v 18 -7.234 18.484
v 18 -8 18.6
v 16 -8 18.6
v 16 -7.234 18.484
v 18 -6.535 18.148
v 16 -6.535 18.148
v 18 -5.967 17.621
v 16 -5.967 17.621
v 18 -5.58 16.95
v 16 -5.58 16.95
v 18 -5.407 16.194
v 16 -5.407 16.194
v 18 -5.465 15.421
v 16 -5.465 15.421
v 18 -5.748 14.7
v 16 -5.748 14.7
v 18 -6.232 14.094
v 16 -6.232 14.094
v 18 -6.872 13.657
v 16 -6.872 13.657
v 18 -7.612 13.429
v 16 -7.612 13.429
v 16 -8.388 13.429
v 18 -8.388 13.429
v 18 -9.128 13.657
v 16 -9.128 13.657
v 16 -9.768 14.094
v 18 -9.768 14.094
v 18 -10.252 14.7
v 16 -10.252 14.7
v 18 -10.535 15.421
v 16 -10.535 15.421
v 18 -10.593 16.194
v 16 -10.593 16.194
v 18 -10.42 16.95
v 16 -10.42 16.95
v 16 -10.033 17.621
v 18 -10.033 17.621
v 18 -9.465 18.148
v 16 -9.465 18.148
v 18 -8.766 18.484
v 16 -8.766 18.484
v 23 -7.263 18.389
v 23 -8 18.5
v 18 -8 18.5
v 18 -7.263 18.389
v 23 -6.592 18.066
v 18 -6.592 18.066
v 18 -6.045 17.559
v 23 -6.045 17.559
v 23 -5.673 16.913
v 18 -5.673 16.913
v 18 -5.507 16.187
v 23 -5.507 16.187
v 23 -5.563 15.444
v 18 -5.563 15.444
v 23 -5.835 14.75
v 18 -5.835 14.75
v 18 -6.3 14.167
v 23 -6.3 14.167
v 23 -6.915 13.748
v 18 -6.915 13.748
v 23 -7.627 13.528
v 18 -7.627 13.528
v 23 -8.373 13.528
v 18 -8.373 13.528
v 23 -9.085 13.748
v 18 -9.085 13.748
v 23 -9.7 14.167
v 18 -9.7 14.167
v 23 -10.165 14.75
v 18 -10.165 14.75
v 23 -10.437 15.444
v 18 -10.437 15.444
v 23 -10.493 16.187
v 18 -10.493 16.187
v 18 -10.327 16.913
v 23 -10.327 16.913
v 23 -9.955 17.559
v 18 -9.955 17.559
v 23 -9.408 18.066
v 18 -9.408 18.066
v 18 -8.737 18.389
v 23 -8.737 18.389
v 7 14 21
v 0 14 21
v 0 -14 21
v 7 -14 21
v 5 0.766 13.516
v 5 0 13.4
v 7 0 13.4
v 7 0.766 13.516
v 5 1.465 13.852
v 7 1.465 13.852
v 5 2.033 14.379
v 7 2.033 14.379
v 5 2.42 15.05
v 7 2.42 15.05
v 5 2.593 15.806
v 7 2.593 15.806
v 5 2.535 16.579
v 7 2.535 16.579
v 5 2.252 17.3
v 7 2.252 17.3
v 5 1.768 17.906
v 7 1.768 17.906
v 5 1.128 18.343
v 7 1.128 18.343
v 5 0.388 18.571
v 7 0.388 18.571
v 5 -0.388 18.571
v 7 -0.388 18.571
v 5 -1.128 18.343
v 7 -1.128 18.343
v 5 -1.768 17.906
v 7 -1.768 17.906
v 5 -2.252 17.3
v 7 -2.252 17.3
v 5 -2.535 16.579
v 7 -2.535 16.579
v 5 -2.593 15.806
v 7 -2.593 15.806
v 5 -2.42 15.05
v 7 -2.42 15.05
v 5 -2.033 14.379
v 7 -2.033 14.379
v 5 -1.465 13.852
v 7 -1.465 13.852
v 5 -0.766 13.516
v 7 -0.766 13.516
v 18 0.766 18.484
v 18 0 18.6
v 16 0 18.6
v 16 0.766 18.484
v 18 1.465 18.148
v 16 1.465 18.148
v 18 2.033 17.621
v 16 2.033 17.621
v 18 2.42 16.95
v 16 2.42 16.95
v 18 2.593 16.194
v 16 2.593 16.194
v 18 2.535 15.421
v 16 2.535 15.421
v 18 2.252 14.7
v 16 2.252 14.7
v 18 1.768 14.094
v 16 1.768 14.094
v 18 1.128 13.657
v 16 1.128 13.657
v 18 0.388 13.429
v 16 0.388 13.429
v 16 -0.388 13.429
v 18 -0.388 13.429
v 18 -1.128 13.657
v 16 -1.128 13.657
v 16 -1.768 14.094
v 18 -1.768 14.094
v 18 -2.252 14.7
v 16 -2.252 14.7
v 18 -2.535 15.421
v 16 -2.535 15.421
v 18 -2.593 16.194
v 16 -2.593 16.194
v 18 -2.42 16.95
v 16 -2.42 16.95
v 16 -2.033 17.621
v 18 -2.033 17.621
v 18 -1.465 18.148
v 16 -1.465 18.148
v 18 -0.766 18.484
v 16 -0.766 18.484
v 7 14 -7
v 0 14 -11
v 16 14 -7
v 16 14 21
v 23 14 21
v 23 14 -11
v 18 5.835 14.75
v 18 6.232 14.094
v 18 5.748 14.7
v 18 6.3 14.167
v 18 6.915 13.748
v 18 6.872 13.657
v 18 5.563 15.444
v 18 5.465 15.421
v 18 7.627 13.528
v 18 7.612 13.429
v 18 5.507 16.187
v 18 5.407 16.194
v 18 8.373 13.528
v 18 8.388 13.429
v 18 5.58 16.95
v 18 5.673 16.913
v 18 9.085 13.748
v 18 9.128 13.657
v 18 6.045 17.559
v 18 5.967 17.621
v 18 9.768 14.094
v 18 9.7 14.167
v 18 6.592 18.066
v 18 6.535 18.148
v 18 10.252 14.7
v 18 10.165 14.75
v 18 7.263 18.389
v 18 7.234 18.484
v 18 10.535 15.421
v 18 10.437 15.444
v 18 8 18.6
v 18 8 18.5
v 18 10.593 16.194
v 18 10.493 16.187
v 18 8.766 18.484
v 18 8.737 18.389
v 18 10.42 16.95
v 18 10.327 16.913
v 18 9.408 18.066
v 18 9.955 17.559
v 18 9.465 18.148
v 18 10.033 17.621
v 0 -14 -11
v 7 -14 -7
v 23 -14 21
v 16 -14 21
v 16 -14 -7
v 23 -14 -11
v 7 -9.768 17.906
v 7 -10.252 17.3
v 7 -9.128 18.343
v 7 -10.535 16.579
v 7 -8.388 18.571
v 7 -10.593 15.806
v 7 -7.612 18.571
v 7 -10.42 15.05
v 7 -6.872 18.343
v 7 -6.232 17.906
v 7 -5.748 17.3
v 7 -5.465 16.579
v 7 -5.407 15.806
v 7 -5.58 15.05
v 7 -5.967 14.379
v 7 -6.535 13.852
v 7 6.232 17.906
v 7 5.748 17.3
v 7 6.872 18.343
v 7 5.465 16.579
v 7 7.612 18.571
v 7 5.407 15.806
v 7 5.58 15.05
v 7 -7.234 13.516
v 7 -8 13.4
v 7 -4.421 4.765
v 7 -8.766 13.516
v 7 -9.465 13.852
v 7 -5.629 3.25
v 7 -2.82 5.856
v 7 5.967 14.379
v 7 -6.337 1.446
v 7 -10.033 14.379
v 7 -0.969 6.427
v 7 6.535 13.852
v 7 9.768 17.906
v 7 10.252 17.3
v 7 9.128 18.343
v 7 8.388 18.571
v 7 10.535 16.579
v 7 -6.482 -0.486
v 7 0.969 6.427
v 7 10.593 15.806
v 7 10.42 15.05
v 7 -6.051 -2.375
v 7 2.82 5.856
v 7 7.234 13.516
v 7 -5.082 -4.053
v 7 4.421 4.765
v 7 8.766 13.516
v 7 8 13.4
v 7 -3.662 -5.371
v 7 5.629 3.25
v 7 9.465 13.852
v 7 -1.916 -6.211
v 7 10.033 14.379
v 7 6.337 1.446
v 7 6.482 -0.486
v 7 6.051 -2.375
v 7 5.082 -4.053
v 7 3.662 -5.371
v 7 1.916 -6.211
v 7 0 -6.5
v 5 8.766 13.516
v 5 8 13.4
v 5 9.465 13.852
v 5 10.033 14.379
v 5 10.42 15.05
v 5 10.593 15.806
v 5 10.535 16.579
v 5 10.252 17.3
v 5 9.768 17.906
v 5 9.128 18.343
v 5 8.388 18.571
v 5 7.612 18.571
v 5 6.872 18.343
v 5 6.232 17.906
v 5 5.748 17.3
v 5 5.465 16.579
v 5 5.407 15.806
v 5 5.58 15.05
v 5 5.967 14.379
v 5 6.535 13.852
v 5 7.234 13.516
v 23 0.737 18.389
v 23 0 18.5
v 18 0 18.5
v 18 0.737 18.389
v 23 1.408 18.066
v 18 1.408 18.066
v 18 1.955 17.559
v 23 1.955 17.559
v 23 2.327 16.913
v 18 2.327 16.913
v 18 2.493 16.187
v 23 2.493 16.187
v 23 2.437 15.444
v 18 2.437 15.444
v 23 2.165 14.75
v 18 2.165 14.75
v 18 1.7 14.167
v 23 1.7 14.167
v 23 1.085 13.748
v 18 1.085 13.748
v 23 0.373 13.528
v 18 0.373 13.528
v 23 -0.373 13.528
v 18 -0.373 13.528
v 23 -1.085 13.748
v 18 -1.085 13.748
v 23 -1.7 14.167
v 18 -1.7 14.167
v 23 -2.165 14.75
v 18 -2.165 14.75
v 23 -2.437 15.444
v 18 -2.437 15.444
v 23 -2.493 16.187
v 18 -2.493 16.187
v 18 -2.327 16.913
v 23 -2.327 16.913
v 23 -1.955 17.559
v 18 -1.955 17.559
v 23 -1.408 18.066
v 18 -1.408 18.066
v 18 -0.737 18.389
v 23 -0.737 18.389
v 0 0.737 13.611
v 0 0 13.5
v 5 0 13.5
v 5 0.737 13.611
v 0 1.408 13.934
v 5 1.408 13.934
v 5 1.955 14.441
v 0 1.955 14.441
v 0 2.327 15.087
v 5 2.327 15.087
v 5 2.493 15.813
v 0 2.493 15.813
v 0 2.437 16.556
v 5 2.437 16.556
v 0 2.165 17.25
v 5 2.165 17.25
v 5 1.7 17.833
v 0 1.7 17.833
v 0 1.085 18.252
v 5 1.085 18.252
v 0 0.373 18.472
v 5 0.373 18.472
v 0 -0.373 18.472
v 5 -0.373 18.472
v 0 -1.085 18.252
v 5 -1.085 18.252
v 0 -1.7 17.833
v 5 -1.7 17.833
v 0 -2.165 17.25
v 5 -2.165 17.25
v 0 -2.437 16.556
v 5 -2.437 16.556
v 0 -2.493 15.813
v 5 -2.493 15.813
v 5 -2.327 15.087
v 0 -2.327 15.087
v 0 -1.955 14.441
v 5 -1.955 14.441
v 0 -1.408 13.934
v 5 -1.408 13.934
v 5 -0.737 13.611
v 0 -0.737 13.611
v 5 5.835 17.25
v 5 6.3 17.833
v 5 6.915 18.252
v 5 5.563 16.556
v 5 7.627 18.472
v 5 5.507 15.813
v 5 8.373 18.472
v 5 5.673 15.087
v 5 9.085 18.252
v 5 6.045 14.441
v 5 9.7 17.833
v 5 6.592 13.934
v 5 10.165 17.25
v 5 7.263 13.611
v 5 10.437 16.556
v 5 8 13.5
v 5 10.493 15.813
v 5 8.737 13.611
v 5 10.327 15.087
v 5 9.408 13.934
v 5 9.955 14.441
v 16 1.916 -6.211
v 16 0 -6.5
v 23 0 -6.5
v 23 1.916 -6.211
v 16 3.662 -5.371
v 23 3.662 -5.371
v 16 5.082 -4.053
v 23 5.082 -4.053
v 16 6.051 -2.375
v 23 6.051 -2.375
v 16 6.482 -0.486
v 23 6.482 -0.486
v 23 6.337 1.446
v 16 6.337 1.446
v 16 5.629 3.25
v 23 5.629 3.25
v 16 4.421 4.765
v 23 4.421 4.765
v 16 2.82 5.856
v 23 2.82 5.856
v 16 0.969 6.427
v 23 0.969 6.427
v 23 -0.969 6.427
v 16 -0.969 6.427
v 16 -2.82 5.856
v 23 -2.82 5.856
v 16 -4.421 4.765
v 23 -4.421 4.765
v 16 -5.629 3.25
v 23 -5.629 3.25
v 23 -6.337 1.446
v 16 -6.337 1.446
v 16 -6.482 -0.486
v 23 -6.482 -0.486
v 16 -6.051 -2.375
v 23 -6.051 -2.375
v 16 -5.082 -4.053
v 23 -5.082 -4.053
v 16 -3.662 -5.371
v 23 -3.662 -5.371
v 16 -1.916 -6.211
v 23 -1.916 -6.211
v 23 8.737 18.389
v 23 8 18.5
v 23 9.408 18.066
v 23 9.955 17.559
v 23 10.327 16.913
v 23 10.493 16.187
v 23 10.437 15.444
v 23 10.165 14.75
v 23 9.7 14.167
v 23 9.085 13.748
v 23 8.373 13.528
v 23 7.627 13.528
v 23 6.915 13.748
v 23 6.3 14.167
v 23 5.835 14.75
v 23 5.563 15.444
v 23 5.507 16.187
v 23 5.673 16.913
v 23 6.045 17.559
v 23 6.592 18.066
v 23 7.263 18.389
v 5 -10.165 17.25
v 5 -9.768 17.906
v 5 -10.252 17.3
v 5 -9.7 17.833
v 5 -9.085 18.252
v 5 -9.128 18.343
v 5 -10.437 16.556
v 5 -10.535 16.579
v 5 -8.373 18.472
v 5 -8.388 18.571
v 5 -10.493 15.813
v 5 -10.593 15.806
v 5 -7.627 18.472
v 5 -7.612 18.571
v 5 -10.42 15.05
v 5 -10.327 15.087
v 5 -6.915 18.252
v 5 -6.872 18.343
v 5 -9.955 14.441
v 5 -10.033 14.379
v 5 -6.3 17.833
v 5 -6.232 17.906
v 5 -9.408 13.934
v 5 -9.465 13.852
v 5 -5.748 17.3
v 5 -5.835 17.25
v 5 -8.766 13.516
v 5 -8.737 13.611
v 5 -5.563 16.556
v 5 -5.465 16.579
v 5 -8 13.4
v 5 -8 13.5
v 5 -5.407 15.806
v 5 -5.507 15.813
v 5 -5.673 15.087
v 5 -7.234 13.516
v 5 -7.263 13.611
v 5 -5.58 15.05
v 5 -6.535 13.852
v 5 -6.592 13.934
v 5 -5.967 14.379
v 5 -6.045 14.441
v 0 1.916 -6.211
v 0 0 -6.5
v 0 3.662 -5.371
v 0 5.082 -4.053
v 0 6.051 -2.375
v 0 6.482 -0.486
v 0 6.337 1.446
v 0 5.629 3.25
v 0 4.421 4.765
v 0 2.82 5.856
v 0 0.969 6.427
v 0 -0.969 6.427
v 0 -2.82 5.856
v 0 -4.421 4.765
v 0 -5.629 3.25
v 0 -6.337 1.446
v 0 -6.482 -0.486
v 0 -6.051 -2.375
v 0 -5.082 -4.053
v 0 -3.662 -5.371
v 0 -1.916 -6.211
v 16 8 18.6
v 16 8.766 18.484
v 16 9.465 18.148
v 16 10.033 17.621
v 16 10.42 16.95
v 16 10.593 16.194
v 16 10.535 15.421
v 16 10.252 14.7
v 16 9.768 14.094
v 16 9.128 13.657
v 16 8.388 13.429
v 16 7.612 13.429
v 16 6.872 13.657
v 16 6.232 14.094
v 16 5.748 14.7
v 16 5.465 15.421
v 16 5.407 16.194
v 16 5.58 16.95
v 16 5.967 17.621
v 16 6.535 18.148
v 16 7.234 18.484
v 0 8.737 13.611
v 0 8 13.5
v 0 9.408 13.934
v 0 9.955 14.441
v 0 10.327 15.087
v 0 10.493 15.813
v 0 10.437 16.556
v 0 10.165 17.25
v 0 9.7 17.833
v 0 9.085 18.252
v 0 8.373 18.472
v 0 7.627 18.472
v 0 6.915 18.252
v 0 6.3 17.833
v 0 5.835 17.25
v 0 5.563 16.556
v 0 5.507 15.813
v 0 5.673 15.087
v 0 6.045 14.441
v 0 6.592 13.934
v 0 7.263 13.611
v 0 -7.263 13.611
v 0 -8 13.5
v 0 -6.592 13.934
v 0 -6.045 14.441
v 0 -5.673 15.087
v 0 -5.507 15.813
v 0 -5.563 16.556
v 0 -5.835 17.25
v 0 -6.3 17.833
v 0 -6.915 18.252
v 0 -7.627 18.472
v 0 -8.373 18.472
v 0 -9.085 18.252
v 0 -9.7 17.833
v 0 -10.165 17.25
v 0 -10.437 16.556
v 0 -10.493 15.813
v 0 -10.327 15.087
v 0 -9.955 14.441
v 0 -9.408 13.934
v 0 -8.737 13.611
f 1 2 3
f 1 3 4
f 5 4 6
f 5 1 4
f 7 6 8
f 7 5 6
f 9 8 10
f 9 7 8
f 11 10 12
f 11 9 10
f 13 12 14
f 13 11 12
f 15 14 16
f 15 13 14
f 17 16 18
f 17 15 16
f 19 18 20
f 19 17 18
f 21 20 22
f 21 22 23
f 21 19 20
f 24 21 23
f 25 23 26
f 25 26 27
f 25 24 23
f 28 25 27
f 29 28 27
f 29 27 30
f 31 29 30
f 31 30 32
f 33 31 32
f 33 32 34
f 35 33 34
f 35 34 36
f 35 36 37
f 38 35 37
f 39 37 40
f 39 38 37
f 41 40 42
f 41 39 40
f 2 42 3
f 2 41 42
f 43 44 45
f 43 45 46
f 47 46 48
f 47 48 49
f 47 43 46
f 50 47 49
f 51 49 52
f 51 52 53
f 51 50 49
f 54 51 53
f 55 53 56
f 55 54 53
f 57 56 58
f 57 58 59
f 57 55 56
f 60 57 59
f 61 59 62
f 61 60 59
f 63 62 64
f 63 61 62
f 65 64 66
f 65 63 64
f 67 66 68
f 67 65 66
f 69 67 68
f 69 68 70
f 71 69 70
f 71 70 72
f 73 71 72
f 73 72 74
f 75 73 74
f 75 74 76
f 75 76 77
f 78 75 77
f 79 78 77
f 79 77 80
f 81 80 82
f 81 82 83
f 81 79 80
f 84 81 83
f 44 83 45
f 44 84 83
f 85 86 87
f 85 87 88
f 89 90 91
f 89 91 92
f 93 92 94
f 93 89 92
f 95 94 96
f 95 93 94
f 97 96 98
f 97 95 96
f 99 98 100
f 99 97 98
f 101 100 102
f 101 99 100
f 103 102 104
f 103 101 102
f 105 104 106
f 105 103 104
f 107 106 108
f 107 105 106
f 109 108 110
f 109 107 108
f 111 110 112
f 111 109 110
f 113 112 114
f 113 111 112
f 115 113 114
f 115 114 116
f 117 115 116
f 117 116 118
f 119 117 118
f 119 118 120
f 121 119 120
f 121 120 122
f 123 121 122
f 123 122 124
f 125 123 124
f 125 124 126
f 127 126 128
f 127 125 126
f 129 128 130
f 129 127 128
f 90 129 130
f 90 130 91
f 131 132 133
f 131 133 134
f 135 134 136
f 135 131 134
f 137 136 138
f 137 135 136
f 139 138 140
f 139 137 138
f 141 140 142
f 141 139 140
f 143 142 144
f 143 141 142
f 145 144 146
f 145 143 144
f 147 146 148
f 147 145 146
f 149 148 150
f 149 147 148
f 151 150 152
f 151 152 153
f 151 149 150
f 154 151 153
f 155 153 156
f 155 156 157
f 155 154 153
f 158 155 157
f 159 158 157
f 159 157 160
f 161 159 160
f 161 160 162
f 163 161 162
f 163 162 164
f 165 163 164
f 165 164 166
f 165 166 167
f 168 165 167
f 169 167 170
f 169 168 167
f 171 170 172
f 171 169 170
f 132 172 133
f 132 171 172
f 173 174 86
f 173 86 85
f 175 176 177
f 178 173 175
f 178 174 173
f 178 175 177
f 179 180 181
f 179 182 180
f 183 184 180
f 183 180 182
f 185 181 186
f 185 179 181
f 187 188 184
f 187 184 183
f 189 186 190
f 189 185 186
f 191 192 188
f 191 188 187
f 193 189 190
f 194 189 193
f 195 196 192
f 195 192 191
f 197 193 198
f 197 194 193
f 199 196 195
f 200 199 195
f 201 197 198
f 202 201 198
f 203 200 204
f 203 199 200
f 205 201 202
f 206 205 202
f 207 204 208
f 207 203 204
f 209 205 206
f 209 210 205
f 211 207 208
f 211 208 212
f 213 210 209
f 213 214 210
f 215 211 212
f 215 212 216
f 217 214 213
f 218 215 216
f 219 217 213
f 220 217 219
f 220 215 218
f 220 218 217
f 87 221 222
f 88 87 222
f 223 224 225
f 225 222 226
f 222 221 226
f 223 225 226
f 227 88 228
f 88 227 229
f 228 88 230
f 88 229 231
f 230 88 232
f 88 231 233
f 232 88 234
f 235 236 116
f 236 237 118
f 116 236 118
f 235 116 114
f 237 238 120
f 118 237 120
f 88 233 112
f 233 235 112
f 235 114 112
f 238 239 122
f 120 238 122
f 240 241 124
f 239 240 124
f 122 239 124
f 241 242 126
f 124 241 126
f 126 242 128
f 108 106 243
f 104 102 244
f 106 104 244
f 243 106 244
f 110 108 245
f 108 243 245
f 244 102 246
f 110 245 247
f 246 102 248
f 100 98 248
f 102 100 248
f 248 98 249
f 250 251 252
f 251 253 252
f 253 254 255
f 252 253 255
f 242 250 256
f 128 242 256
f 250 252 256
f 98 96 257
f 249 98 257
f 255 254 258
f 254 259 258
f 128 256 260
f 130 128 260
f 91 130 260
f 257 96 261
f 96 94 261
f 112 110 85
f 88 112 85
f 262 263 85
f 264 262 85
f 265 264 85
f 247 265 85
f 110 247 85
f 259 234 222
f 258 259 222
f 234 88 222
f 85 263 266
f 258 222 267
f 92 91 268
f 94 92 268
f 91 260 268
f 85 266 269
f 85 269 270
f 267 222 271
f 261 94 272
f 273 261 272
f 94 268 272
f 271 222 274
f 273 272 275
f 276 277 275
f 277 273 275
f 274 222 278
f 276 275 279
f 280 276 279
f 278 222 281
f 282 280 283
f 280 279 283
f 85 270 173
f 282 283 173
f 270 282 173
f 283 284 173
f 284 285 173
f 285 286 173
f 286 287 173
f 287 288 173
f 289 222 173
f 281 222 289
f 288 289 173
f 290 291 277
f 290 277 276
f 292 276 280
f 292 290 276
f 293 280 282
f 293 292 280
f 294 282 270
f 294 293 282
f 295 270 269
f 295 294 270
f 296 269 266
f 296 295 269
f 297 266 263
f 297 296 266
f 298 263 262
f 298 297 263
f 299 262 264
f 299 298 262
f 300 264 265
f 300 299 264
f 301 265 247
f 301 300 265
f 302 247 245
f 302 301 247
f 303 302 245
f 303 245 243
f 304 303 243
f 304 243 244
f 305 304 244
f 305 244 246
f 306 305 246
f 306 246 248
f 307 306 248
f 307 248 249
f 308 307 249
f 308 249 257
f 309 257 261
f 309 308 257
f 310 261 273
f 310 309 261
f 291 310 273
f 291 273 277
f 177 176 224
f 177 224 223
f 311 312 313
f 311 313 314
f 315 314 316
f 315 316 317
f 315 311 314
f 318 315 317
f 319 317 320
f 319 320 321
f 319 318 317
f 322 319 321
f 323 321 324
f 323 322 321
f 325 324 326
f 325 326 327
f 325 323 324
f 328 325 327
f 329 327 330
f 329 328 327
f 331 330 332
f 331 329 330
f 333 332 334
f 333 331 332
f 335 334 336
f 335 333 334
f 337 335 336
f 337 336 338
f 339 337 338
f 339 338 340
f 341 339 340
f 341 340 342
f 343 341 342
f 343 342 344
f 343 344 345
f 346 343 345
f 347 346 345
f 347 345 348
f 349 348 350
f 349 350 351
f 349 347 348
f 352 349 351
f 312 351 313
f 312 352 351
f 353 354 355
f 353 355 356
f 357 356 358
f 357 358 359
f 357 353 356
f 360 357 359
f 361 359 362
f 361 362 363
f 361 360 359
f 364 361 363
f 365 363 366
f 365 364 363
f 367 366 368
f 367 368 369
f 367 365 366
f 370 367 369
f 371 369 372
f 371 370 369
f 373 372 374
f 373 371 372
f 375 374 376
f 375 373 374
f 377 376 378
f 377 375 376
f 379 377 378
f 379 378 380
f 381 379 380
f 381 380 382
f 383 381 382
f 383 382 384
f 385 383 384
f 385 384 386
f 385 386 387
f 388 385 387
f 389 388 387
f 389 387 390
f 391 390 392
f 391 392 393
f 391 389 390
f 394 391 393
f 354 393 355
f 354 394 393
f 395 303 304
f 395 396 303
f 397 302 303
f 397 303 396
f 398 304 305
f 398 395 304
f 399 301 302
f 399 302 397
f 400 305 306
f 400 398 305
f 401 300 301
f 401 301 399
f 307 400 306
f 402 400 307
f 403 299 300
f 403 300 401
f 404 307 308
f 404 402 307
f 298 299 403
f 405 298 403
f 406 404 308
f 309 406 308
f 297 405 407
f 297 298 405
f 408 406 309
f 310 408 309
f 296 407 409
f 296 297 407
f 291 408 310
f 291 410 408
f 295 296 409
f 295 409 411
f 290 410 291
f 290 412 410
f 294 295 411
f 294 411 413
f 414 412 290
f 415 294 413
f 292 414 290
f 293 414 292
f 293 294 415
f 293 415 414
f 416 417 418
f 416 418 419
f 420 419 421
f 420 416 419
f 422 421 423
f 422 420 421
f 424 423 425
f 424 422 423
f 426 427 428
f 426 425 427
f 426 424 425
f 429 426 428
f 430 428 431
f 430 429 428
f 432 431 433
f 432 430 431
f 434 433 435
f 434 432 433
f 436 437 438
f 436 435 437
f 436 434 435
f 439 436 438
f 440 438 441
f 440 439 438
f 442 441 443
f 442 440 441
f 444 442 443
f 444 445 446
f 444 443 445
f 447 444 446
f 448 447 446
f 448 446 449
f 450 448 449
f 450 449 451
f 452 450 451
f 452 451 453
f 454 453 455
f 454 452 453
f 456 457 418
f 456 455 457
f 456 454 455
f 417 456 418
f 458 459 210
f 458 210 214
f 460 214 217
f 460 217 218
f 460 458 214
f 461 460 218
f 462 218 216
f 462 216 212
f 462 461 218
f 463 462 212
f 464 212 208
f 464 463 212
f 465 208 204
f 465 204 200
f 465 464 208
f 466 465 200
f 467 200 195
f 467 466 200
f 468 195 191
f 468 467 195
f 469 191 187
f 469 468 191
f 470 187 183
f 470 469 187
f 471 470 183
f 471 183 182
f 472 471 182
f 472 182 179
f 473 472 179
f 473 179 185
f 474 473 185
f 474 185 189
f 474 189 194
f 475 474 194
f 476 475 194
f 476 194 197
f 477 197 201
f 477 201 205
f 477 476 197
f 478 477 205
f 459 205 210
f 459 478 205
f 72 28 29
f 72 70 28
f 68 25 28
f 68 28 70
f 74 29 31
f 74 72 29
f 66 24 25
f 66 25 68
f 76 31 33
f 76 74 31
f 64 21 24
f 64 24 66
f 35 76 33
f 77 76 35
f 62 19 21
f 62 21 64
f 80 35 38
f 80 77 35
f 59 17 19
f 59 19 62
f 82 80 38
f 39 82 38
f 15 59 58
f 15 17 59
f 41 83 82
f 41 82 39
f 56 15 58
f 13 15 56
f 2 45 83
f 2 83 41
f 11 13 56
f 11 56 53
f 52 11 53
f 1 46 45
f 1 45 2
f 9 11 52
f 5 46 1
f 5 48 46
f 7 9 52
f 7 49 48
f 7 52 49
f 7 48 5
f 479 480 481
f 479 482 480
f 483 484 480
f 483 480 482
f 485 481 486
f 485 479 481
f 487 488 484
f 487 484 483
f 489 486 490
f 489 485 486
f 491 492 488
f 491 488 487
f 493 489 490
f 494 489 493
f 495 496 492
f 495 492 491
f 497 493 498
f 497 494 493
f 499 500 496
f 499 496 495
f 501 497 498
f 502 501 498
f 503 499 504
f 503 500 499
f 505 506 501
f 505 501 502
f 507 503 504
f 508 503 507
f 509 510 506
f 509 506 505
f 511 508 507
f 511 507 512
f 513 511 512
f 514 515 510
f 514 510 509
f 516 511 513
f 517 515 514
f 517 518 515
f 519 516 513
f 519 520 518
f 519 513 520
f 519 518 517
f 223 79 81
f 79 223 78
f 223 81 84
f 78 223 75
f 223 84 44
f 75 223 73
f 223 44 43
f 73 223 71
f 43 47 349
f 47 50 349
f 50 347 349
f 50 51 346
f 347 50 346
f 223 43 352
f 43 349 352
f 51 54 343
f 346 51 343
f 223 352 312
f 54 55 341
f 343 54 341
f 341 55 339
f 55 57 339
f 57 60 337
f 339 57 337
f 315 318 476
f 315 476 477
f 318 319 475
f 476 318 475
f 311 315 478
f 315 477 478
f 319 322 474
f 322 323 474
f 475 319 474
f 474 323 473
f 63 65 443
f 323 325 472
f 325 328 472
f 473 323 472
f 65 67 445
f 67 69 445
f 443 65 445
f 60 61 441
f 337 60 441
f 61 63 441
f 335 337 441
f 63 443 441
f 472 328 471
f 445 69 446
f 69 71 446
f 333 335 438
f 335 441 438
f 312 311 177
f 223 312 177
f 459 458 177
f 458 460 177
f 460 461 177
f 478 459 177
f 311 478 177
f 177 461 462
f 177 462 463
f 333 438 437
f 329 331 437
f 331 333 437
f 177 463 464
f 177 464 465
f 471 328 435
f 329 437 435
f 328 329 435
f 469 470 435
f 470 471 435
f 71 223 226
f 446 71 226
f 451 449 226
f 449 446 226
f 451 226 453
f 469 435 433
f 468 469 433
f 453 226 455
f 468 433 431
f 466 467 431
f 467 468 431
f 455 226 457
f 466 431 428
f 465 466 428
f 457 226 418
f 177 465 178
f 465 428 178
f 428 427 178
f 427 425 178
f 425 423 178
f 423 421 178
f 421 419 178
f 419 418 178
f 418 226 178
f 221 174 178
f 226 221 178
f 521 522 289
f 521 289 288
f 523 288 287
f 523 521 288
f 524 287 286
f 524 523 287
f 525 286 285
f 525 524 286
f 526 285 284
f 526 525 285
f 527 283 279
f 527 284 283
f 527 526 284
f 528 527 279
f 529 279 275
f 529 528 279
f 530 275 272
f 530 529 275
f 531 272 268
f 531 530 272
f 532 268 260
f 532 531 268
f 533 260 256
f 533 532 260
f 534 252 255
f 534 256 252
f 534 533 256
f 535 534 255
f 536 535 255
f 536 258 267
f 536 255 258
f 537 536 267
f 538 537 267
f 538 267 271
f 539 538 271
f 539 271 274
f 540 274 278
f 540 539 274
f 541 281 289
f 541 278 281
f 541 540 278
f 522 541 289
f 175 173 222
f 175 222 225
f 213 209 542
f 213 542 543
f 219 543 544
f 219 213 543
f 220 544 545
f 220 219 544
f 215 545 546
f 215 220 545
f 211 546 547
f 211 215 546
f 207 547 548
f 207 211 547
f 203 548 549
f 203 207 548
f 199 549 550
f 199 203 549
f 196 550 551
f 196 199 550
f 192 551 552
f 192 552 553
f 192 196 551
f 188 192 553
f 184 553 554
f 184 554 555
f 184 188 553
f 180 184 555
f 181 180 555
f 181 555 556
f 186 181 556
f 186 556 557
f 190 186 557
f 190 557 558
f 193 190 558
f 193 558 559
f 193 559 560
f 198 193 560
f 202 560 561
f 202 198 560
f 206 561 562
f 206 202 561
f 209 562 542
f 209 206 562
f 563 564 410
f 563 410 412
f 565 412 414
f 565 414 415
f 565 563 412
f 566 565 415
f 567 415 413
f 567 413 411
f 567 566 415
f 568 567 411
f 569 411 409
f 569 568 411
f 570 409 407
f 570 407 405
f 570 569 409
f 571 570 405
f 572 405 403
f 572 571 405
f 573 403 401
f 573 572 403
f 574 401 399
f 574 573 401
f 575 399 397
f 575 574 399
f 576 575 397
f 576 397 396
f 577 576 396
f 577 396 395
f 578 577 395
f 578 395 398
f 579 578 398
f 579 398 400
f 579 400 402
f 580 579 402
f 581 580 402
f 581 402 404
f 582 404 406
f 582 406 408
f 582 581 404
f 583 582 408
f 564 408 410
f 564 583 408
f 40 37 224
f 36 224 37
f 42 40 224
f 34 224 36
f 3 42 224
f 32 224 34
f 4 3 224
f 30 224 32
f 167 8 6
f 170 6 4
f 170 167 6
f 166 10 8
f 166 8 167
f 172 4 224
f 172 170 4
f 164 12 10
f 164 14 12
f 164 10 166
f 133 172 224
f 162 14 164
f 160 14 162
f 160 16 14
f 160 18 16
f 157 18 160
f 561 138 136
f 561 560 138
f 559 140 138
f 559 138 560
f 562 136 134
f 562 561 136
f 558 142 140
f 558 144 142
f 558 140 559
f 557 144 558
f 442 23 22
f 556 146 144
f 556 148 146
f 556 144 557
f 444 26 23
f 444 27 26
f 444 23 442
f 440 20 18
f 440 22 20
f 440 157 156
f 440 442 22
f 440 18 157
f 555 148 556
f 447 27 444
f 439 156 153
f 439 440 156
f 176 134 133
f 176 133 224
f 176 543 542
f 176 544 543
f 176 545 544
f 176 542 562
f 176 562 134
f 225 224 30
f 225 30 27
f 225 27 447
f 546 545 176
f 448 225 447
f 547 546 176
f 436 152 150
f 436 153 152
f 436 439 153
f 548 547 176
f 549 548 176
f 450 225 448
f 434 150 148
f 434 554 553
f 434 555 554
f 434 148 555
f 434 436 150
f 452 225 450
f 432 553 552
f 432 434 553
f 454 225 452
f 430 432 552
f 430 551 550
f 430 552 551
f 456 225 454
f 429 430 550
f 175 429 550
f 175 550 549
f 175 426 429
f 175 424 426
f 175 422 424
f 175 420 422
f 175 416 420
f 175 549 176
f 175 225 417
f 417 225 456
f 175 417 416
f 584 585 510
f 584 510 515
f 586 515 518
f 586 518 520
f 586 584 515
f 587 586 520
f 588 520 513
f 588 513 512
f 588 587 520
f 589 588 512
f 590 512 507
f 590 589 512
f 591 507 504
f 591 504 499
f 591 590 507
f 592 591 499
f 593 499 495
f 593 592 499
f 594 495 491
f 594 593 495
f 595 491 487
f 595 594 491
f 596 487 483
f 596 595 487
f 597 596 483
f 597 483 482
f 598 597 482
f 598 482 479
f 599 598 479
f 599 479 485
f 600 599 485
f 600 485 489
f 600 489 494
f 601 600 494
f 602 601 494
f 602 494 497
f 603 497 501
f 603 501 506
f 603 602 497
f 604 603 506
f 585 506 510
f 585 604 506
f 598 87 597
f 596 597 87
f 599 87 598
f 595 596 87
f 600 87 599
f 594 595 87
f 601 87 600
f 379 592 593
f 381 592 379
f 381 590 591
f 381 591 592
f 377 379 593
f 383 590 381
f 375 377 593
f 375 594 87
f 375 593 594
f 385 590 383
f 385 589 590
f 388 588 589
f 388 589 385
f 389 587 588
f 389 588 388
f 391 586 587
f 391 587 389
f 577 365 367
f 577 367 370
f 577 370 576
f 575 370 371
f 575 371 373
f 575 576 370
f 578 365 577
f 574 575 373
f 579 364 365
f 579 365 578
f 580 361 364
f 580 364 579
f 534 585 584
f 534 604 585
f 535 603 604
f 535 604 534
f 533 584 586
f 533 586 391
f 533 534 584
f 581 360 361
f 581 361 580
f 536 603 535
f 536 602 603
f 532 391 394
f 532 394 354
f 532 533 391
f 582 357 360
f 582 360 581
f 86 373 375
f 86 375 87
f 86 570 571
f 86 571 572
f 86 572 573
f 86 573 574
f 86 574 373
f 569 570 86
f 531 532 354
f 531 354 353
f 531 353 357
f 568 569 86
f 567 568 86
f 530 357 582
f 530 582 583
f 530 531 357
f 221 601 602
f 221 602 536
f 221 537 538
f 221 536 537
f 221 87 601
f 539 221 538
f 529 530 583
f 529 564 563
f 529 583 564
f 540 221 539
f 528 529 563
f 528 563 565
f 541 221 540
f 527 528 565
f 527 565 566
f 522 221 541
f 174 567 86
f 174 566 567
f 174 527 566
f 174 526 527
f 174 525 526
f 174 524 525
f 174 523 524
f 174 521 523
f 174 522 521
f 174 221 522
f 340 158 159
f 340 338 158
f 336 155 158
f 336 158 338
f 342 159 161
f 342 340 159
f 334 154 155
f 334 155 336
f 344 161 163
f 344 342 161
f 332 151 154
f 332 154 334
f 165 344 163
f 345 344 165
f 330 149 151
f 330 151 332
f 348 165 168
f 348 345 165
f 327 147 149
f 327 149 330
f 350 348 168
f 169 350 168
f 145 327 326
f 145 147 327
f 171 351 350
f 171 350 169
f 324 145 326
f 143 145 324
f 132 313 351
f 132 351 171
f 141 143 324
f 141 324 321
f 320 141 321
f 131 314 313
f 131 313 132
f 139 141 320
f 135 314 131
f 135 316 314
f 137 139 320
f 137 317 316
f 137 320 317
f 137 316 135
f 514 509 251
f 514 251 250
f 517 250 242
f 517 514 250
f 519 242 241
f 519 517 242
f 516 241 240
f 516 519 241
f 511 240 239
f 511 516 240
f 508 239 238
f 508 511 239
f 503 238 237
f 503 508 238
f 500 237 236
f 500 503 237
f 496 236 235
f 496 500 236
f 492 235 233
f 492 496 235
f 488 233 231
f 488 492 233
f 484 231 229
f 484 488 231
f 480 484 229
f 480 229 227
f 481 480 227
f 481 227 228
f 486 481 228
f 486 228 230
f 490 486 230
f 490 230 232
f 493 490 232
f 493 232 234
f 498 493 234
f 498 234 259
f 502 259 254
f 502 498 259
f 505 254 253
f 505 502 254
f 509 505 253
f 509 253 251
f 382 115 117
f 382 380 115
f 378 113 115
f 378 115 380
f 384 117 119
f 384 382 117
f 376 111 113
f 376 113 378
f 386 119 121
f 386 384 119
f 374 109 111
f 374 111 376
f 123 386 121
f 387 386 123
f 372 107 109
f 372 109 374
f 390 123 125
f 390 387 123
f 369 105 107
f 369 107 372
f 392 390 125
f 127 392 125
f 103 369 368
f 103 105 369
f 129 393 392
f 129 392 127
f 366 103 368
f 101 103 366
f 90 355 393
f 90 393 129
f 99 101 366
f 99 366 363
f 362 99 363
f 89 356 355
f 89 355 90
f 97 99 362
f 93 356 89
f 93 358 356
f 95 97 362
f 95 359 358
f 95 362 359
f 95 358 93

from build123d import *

# Parameters (mm, degrees)
CYLINDER112_R             = 2.6
CYLINDER112_DEPTH         = 2
CYLINDER113_R             = 2.5
CYLINDER113_DEPTH         = 5
FUSION048_PLACEMENT_ANGLE = 90
CYLINDER109_R             = 2.6
CYLINDER109_DEPTH         = 2
CYLINDER108_R             = 2.5
CYLINDER108_DEPTH         = 5
FUSION043_PLACEMENT_ANGLE = 90
CYLINDER107_R             = 2.6
CYLINDER107_DEPTH         = 2
CYLINDER106_R             = 2.5
CYLINDER106_DEPTH         = 5
FUSION042_PLACEMENT_ANGLE = 90
CYLINDER103_R             = 2.6
CYLINDER103_DEPTH         = 2
CYLINDER102_R             = 2.5
CYLINDER102_DEPTH         = 5
FUSION040_PLACEMENT_ANGLE = 90
CYLINDER101_R             = 2.6
CYLINDER101_DEPTH         = 2
CYLINDER100_R             = 2.5
CYLINDER100_DEPTH         = 5
FUSION039_PLACEMENT_ANGLE = 90
CYLINDER099_R             = 6.5
CYLINDER099_DEPTH         = 130
CYLINDER110_R             = 2.6
CYLINDER110_DEPTH         = 2
CYLINDER111_R             = 2.5
CYLINDER111_DEPTH         = 5
FUSION046_PLACEMENT_ANGLE = 90
BOX028_W                  = 23
BOX028_H                  = 28
BOX028_DEPTH              = 4
BOX029_W                  = 7
BOX029_H                  = 28
BOX029_DEPTH              = 32
BOX027_W                  = 7
BOX027_H                  = 28
BOX027_DEPTH              = 32


with BuildPart() as cilindro112:
    # Cylinder112 → Cylinder112 (new body)
    with BuildSketch(Plane.XY.offset(5)):
        Circle(CYLINDER112_R)
    extrude(amount=CYLINDER112_DEPTH)


with BuildPart() as enganche_lego017:
    # Cylinder113 → Cylinder113 (new body)
    with BuildSketch(Plane.XY):
        Circle(CYLINDER113_R)
    extrude(amount=CYLINDER113_DEPTH)

    # Fusion048: union Cilindro112
    add(cilindro112.part)


with BuildPart() as enganche_lego017_1:
    # Fusion048 placement: moved
    add(enganche_lego017.part.moved(Location((0, 0, 16))).rotate(Axis((0, 0, 16), (0, 1, 0)), FUSION048_PLACEMENT_ANGLE))


with BuildPart() as cilindro109:
    # Cylinder109 → Cylinder109 (new body)
    with BuildSketch(Plane.XY.offset(5)):
        Circle(CYLINDER109_R)
    extrude(amount=CYLINDER109_DEPTH)


with BuildPart() as enganche_lego015:
    # Cylinder108 → Cylinder108 (new body)
    with BuildSketch(Plane.XY):
        Circle(CYLINDER108_R)
    extrude(amount=CYLINDER108_DEPTH)

    # Fusion043: union Cilindro109
    add(cilindro109.part)


with BuildPart() as enganche_lego015_1:
    # Fusion043 placement: moved
    add(enganche_lego015.part.moved(Location((23, 8, 16))).rotate(Axis((23, 8, 16), (0, -1, 0)), FUSION043_PLACEMENT_ANGLE))


with BuildPart() as cilindro107:
    # Cylinder107 → Cylinder107 (new body)
    with BuildSketch(Plane.XY.offset(5)):
        Circle(CYLINDER107_R)
    extrude(amount=CYLINDER107_DEPTH)


with BuildPart() as enganche_lego014:
    # Cylinder106 → Cylinder106 (new body)
    with BuildSketch(Plane.XY):
        Circle(CYLINDER106_R)
    extrude(amount=CYLINDER106_DEPTH)

    # Fusion042: union Cilindro107
    add(cilindro107.part)


with BuildPart() as enganche_lego014_1:
    # Fusion042 placement: moved
    add(enganche_lego014.part.moved(Location((23, -8, 16))).rotate(Axis((23, -8, 16), (0, -1, 0)), FUSION042_PLACEMENT_ANGLE))


with BuildPart() as cilindro103:
    # Cylinder103 → Cylinder103 (new body)
    with BuildSketch(Plane.XY.offset(5)):
        Circle(CYLINDER103_R)
    extrude(amount=CYLINDER103_DEPTH)


with BuildPart() as enganche_lego012:
    # Cylinder102 → Cylinder102 (new body)
    with BuildSketch(Plane.XY):
        Circle(CYLINDER102_R)
    extrude(amount=CYLINDER102_DEPTH)

    # Fusion040: union Cilindro103
    add(cilindro103.part)


with BuildPart() as enganche_lego012_1:
    # Fusion040 placement: moved
    add(enganche_lego012.part.moved(Location((0, -8, 16))).rotate(Axis((0, -8, 16), (0, 1, 0)), FUSION040_PLACEMENT_ANGLE))


with BuildPart() as cilindro101:
    # Cylinder101 → Cylinder101 (new body)
    with BuildSketch(Plane.XY.offset(5)):
        Circle(CYLINDER101_R)
    extrude(amount=CYLINDER101_DEPTH)


with BuildPart() as enganche_lego011:
    # Cylinder100 → Cylinder100 (new body)
    with BuildSketch(Plane.XY):
        Circle(CYLINDER100_R)
    extrude(amount=CYLINDER100_DEPTH)

    # Fusion039: union Cilindro101
    add(cilindro101.part)


with BuildPart() as enganche_lego011_1:
    # Fusion039 placement: moved
    add(enganche_lego011.part.moved(Location((0, 8, 16))).rotate(Axis((0, 8, 16), (0, 1, 0)), FUSION039_PLACEMENT_ANGLE))


with BuildPart() as cilindro099:
    # Cylinder099 → Cylinder099 (new body)
    with BuildSketch(Plane(origin=(-2, 0, 0), x_dir=(0, 0, -1), z_dir=(1, 0, 0))):
        Circle(CYLINDER099_R)
    extrude(amount=CYLINDER099_DEPTH)


with BuildPart() as cilindro110:
    # Cylinder110 → Cylinder110 (new body)
    with BuildSketch(Plane.XY.offset(5)):
        Circle(CYLINDER110_R)
    extrude(amount=CYLINDER110_DEPTH)


with BuildPart() as fusion047:
    # Cylinder111 → Cylinder111 (new body)
    with BuildSketch(Plane.XY):
        Circle(CYLINDER111_R)
    extrude(amount=CYLINDER111_DEPTH)

    # Fusion046: union Cilindro110
    add(cilindro110.part)


with BuildPart() as fusion047_1:
    # Fusion046 placement: moved
    add(fusion047.part.moved(Location((23, 0, 16))).rotate(Axis((23, 0, 16), (0, -1, 0)), FUSION046_PLACEMENT_ANGLE))

    # Fusion047: union enganche_lego015, enganche_lego014, enganche_lego012, enganche_lego011, Cilindro099
    add(enganche_lego015_1.part)
    add(enganche_lego014_1.part)
    add(enganche_lego012_1.part)
    add(enganche_lego011_1.part)
    add(cilindro099.part)


with BuildPart() as cubo025:
    # Box028 → Box028 (new body)
    with BuildSketch(Plane(origin=(0, -14, -11), x_dir=(1, 0, 0), z_dir=(0, 0, 1))):
        with Locations((11.5, 14)):
            Rectangle(BOX028_W, BOX028_H)
    extrude(amount=BOX028_DEPTH)


with BuildPart() as cubo026:
    # Box029 → Box029 (new body)
    with BuildSketch(Plane(origin=(16, -14, -11), x_dir=(1, 0, 0), z_dir=(0, 0, 1))):
        with Locations((3.5, 14)):
            Rectangle(BOX029_W, BOX029_H)
    extrude(amount=BOX029_DEPTH)


with BuildPart() as barra_garra001:
    # Box027 → Box027 (new body)
    with BuildSketch(Plane(origin=(0, -14, -11), x_dir=(1, 0, 0), z_dir=(0, 0, 1))):
        with Locations((3.5, 14)):
            Rectangle(BOX027_W, BOX027_H)
    extrude(amount=BOX027_DEPTH)

    # Fusion045: union Cubo025, Cubo026
    add(cubo025.part)
    add(cubo026.part)

    # Cut054: cut Fusion047
    add(fusion047_1.part, mode=Mode.SUBTRACT)

    # Cut055: cut enganche_lego017
    add(enganche_lego017_1.part, mode=Mode.SUBTRACT)


solid = barra_garra001.part
